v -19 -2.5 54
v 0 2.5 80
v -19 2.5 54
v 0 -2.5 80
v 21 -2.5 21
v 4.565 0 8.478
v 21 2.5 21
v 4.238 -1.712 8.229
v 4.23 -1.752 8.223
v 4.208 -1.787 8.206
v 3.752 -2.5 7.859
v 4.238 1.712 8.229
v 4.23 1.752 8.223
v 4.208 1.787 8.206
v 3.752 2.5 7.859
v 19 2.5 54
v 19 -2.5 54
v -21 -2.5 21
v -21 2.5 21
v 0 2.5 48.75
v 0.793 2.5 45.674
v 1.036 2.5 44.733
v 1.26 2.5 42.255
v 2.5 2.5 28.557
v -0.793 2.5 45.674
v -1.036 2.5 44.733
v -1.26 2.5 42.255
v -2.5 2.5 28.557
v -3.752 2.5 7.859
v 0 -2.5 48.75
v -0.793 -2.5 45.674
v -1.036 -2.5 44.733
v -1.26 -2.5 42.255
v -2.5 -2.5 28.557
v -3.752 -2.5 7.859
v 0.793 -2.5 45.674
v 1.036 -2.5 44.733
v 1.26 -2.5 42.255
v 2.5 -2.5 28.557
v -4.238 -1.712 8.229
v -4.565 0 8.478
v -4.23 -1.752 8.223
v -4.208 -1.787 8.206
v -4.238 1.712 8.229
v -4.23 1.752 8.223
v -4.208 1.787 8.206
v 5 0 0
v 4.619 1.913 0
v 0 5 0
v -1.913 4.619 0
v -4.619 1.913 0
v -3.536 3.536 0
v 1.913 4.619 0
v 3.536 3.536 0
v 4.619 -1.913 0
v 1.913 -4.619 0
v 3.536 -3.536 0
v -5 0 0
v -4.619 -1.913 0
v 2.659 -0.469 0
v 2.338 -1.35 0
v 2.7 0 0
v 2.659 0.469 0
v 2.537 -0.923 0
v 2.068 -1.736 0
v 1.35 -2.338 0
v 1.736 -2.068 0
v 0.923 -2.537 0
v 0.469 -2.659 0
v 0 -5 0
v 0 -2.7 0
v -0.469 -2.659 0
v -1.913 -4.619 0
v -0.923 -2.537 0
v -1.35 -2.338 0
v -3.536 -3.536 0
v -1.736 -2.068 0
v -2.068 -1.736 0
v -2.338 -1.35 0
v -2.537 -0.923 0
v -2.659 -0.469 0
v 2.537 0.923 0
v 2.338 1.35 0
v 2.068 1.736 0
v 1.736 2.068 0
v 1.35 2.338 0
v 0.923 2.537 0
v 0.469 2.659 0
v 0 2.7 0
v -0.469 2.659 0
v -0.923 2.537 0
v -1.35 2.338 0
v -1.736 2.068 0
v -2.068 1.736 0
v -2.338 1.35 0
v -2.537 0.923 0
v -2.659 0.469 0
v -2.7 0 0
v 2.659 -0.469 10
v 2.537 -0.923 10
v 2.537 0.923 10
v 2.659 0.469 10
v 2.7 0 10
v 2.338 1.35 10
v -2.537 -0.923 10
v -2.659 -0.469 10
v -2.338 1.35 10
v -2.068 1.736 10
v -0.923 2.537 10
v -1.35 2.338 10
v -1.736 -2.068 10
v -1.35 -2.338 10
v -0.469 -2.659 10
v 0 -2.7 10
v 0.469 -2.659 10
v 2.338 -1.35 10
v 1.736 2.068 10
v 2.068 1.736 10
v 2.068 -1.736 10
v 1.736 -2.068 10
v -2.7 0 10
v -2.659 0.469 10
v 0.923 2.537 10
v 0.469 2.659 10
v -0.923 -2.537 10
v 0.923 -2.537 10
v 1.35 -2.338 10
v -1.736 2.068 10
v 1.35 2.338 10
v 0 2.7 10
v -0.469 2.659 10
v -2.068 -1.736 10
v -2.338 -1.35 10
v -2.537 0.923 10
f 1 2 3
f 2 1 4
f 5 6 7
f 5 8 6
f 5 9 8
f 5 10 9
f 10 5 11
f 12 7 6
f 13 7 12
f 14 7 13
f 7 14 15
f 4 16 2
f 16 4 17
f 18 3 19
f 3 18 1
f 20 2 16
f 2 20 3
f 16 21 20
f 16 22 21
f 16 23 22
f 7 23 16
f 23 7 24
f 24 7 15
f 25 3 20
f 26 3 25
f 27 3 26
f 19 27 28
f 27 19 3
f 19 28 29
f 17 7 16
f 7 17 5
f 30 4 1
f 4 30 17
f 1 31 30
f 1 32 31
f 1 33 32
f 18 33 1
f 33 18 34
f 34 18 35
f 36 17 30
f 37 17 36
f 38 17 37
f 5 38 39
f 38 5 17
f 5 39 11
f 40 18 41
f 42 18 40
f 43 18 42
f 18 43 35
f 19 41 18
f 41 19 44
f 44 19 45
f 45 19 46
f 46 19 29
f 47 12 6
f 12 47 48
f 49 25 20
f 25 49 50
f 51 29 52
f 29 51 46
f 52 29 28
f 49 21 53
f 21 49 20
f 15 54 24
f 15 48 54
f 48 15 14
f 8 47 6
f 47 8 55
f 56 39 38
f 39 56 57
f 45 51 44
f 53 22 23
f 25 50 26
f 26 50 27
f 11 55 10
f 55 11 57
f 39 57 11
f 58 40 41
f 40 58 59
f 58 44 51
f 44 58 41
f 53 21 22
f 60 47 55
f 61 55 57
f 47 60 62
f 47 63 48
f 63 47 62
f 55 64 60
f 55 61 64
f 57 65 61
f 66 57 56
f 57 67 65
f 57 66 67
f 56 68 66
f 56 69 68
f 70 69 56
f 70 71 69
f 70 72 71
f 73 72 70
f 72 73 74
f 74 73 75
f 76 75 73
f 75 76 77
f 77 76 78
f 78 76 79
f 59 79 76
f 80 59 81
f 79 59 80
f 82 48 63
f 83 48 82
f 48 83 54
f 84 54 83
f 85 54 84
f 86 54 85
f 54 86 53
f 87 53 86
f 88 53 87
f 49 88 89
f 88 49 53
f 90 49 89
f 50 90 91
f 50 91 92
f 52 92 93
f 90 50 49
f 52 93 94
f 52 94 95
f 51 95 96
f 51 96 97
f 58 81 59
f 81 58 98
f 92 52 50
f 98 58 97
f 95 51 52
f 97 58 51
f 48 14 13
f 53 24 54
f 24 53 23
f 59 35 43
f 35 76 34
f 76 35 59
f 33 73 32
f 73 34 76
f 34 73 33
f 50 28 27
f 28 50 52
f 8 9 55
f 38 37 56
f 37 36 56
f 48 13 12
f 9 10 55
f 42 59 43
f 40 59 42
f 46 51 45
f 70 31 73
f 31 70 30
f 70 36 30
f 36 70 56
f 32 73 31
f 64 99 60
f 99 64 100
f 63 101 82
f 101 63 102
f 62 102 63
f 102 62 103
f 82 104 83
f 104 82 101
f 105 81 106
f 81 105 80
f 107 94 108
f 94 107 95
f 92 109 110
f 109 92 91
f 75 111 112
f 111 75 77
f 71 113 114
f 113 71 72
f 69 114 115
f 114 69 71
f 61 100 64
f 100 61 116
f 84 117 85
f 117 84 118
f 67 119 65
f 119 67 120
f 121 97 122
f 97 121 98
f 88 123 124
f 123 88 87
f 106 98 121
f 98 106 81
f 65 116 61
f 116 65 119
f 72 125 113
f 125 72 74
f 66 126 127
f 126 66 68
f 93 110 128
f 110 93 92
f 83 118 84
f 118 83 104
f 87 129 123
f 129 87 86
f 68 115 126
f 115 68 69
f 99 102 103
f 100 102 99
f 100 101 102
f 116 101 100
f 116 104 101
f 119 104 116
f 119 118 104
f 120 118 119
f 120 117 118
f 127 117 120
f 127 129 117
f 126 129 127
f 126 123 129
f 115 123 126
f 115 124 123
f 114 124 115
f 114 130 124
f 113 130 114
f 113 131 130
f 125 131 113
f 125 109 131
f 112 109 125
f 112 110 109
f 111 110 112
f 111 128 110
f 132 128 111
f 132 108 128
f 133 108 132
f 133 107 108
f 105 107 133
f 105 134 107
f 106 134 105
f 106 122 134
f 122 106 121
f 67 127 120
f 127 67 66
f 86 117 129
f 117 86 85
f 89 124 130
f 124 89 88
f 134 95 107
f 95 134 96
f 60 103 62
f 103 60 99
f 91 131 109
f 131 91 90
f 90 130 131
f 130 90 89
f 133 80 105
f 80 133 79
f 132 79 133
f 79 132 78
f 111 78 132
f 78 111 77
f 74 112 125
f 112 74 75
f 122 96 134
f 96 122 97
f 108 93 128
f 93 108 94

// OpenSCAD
union() {
	difference() {
		union() {
			translate(v = [0, 2.5000000000, 0]) {
				rotate(a = 90, v = [1, 0, 0]) {
					linear_extrude(height = 5) {
						polygon(paths = [[0, 1, 2, 3, 4, 5]], points = [[0, 5], [21, 21], [19, 54], [0, 80], [-19, 54], [-21, 21]]);
					}
				}
			}
			cylinder(h = 78, r1 = 5, r2 = 1);
		}
		cylinder($fn = 36, h = 10, r = 2.7000000000);
	}
}
